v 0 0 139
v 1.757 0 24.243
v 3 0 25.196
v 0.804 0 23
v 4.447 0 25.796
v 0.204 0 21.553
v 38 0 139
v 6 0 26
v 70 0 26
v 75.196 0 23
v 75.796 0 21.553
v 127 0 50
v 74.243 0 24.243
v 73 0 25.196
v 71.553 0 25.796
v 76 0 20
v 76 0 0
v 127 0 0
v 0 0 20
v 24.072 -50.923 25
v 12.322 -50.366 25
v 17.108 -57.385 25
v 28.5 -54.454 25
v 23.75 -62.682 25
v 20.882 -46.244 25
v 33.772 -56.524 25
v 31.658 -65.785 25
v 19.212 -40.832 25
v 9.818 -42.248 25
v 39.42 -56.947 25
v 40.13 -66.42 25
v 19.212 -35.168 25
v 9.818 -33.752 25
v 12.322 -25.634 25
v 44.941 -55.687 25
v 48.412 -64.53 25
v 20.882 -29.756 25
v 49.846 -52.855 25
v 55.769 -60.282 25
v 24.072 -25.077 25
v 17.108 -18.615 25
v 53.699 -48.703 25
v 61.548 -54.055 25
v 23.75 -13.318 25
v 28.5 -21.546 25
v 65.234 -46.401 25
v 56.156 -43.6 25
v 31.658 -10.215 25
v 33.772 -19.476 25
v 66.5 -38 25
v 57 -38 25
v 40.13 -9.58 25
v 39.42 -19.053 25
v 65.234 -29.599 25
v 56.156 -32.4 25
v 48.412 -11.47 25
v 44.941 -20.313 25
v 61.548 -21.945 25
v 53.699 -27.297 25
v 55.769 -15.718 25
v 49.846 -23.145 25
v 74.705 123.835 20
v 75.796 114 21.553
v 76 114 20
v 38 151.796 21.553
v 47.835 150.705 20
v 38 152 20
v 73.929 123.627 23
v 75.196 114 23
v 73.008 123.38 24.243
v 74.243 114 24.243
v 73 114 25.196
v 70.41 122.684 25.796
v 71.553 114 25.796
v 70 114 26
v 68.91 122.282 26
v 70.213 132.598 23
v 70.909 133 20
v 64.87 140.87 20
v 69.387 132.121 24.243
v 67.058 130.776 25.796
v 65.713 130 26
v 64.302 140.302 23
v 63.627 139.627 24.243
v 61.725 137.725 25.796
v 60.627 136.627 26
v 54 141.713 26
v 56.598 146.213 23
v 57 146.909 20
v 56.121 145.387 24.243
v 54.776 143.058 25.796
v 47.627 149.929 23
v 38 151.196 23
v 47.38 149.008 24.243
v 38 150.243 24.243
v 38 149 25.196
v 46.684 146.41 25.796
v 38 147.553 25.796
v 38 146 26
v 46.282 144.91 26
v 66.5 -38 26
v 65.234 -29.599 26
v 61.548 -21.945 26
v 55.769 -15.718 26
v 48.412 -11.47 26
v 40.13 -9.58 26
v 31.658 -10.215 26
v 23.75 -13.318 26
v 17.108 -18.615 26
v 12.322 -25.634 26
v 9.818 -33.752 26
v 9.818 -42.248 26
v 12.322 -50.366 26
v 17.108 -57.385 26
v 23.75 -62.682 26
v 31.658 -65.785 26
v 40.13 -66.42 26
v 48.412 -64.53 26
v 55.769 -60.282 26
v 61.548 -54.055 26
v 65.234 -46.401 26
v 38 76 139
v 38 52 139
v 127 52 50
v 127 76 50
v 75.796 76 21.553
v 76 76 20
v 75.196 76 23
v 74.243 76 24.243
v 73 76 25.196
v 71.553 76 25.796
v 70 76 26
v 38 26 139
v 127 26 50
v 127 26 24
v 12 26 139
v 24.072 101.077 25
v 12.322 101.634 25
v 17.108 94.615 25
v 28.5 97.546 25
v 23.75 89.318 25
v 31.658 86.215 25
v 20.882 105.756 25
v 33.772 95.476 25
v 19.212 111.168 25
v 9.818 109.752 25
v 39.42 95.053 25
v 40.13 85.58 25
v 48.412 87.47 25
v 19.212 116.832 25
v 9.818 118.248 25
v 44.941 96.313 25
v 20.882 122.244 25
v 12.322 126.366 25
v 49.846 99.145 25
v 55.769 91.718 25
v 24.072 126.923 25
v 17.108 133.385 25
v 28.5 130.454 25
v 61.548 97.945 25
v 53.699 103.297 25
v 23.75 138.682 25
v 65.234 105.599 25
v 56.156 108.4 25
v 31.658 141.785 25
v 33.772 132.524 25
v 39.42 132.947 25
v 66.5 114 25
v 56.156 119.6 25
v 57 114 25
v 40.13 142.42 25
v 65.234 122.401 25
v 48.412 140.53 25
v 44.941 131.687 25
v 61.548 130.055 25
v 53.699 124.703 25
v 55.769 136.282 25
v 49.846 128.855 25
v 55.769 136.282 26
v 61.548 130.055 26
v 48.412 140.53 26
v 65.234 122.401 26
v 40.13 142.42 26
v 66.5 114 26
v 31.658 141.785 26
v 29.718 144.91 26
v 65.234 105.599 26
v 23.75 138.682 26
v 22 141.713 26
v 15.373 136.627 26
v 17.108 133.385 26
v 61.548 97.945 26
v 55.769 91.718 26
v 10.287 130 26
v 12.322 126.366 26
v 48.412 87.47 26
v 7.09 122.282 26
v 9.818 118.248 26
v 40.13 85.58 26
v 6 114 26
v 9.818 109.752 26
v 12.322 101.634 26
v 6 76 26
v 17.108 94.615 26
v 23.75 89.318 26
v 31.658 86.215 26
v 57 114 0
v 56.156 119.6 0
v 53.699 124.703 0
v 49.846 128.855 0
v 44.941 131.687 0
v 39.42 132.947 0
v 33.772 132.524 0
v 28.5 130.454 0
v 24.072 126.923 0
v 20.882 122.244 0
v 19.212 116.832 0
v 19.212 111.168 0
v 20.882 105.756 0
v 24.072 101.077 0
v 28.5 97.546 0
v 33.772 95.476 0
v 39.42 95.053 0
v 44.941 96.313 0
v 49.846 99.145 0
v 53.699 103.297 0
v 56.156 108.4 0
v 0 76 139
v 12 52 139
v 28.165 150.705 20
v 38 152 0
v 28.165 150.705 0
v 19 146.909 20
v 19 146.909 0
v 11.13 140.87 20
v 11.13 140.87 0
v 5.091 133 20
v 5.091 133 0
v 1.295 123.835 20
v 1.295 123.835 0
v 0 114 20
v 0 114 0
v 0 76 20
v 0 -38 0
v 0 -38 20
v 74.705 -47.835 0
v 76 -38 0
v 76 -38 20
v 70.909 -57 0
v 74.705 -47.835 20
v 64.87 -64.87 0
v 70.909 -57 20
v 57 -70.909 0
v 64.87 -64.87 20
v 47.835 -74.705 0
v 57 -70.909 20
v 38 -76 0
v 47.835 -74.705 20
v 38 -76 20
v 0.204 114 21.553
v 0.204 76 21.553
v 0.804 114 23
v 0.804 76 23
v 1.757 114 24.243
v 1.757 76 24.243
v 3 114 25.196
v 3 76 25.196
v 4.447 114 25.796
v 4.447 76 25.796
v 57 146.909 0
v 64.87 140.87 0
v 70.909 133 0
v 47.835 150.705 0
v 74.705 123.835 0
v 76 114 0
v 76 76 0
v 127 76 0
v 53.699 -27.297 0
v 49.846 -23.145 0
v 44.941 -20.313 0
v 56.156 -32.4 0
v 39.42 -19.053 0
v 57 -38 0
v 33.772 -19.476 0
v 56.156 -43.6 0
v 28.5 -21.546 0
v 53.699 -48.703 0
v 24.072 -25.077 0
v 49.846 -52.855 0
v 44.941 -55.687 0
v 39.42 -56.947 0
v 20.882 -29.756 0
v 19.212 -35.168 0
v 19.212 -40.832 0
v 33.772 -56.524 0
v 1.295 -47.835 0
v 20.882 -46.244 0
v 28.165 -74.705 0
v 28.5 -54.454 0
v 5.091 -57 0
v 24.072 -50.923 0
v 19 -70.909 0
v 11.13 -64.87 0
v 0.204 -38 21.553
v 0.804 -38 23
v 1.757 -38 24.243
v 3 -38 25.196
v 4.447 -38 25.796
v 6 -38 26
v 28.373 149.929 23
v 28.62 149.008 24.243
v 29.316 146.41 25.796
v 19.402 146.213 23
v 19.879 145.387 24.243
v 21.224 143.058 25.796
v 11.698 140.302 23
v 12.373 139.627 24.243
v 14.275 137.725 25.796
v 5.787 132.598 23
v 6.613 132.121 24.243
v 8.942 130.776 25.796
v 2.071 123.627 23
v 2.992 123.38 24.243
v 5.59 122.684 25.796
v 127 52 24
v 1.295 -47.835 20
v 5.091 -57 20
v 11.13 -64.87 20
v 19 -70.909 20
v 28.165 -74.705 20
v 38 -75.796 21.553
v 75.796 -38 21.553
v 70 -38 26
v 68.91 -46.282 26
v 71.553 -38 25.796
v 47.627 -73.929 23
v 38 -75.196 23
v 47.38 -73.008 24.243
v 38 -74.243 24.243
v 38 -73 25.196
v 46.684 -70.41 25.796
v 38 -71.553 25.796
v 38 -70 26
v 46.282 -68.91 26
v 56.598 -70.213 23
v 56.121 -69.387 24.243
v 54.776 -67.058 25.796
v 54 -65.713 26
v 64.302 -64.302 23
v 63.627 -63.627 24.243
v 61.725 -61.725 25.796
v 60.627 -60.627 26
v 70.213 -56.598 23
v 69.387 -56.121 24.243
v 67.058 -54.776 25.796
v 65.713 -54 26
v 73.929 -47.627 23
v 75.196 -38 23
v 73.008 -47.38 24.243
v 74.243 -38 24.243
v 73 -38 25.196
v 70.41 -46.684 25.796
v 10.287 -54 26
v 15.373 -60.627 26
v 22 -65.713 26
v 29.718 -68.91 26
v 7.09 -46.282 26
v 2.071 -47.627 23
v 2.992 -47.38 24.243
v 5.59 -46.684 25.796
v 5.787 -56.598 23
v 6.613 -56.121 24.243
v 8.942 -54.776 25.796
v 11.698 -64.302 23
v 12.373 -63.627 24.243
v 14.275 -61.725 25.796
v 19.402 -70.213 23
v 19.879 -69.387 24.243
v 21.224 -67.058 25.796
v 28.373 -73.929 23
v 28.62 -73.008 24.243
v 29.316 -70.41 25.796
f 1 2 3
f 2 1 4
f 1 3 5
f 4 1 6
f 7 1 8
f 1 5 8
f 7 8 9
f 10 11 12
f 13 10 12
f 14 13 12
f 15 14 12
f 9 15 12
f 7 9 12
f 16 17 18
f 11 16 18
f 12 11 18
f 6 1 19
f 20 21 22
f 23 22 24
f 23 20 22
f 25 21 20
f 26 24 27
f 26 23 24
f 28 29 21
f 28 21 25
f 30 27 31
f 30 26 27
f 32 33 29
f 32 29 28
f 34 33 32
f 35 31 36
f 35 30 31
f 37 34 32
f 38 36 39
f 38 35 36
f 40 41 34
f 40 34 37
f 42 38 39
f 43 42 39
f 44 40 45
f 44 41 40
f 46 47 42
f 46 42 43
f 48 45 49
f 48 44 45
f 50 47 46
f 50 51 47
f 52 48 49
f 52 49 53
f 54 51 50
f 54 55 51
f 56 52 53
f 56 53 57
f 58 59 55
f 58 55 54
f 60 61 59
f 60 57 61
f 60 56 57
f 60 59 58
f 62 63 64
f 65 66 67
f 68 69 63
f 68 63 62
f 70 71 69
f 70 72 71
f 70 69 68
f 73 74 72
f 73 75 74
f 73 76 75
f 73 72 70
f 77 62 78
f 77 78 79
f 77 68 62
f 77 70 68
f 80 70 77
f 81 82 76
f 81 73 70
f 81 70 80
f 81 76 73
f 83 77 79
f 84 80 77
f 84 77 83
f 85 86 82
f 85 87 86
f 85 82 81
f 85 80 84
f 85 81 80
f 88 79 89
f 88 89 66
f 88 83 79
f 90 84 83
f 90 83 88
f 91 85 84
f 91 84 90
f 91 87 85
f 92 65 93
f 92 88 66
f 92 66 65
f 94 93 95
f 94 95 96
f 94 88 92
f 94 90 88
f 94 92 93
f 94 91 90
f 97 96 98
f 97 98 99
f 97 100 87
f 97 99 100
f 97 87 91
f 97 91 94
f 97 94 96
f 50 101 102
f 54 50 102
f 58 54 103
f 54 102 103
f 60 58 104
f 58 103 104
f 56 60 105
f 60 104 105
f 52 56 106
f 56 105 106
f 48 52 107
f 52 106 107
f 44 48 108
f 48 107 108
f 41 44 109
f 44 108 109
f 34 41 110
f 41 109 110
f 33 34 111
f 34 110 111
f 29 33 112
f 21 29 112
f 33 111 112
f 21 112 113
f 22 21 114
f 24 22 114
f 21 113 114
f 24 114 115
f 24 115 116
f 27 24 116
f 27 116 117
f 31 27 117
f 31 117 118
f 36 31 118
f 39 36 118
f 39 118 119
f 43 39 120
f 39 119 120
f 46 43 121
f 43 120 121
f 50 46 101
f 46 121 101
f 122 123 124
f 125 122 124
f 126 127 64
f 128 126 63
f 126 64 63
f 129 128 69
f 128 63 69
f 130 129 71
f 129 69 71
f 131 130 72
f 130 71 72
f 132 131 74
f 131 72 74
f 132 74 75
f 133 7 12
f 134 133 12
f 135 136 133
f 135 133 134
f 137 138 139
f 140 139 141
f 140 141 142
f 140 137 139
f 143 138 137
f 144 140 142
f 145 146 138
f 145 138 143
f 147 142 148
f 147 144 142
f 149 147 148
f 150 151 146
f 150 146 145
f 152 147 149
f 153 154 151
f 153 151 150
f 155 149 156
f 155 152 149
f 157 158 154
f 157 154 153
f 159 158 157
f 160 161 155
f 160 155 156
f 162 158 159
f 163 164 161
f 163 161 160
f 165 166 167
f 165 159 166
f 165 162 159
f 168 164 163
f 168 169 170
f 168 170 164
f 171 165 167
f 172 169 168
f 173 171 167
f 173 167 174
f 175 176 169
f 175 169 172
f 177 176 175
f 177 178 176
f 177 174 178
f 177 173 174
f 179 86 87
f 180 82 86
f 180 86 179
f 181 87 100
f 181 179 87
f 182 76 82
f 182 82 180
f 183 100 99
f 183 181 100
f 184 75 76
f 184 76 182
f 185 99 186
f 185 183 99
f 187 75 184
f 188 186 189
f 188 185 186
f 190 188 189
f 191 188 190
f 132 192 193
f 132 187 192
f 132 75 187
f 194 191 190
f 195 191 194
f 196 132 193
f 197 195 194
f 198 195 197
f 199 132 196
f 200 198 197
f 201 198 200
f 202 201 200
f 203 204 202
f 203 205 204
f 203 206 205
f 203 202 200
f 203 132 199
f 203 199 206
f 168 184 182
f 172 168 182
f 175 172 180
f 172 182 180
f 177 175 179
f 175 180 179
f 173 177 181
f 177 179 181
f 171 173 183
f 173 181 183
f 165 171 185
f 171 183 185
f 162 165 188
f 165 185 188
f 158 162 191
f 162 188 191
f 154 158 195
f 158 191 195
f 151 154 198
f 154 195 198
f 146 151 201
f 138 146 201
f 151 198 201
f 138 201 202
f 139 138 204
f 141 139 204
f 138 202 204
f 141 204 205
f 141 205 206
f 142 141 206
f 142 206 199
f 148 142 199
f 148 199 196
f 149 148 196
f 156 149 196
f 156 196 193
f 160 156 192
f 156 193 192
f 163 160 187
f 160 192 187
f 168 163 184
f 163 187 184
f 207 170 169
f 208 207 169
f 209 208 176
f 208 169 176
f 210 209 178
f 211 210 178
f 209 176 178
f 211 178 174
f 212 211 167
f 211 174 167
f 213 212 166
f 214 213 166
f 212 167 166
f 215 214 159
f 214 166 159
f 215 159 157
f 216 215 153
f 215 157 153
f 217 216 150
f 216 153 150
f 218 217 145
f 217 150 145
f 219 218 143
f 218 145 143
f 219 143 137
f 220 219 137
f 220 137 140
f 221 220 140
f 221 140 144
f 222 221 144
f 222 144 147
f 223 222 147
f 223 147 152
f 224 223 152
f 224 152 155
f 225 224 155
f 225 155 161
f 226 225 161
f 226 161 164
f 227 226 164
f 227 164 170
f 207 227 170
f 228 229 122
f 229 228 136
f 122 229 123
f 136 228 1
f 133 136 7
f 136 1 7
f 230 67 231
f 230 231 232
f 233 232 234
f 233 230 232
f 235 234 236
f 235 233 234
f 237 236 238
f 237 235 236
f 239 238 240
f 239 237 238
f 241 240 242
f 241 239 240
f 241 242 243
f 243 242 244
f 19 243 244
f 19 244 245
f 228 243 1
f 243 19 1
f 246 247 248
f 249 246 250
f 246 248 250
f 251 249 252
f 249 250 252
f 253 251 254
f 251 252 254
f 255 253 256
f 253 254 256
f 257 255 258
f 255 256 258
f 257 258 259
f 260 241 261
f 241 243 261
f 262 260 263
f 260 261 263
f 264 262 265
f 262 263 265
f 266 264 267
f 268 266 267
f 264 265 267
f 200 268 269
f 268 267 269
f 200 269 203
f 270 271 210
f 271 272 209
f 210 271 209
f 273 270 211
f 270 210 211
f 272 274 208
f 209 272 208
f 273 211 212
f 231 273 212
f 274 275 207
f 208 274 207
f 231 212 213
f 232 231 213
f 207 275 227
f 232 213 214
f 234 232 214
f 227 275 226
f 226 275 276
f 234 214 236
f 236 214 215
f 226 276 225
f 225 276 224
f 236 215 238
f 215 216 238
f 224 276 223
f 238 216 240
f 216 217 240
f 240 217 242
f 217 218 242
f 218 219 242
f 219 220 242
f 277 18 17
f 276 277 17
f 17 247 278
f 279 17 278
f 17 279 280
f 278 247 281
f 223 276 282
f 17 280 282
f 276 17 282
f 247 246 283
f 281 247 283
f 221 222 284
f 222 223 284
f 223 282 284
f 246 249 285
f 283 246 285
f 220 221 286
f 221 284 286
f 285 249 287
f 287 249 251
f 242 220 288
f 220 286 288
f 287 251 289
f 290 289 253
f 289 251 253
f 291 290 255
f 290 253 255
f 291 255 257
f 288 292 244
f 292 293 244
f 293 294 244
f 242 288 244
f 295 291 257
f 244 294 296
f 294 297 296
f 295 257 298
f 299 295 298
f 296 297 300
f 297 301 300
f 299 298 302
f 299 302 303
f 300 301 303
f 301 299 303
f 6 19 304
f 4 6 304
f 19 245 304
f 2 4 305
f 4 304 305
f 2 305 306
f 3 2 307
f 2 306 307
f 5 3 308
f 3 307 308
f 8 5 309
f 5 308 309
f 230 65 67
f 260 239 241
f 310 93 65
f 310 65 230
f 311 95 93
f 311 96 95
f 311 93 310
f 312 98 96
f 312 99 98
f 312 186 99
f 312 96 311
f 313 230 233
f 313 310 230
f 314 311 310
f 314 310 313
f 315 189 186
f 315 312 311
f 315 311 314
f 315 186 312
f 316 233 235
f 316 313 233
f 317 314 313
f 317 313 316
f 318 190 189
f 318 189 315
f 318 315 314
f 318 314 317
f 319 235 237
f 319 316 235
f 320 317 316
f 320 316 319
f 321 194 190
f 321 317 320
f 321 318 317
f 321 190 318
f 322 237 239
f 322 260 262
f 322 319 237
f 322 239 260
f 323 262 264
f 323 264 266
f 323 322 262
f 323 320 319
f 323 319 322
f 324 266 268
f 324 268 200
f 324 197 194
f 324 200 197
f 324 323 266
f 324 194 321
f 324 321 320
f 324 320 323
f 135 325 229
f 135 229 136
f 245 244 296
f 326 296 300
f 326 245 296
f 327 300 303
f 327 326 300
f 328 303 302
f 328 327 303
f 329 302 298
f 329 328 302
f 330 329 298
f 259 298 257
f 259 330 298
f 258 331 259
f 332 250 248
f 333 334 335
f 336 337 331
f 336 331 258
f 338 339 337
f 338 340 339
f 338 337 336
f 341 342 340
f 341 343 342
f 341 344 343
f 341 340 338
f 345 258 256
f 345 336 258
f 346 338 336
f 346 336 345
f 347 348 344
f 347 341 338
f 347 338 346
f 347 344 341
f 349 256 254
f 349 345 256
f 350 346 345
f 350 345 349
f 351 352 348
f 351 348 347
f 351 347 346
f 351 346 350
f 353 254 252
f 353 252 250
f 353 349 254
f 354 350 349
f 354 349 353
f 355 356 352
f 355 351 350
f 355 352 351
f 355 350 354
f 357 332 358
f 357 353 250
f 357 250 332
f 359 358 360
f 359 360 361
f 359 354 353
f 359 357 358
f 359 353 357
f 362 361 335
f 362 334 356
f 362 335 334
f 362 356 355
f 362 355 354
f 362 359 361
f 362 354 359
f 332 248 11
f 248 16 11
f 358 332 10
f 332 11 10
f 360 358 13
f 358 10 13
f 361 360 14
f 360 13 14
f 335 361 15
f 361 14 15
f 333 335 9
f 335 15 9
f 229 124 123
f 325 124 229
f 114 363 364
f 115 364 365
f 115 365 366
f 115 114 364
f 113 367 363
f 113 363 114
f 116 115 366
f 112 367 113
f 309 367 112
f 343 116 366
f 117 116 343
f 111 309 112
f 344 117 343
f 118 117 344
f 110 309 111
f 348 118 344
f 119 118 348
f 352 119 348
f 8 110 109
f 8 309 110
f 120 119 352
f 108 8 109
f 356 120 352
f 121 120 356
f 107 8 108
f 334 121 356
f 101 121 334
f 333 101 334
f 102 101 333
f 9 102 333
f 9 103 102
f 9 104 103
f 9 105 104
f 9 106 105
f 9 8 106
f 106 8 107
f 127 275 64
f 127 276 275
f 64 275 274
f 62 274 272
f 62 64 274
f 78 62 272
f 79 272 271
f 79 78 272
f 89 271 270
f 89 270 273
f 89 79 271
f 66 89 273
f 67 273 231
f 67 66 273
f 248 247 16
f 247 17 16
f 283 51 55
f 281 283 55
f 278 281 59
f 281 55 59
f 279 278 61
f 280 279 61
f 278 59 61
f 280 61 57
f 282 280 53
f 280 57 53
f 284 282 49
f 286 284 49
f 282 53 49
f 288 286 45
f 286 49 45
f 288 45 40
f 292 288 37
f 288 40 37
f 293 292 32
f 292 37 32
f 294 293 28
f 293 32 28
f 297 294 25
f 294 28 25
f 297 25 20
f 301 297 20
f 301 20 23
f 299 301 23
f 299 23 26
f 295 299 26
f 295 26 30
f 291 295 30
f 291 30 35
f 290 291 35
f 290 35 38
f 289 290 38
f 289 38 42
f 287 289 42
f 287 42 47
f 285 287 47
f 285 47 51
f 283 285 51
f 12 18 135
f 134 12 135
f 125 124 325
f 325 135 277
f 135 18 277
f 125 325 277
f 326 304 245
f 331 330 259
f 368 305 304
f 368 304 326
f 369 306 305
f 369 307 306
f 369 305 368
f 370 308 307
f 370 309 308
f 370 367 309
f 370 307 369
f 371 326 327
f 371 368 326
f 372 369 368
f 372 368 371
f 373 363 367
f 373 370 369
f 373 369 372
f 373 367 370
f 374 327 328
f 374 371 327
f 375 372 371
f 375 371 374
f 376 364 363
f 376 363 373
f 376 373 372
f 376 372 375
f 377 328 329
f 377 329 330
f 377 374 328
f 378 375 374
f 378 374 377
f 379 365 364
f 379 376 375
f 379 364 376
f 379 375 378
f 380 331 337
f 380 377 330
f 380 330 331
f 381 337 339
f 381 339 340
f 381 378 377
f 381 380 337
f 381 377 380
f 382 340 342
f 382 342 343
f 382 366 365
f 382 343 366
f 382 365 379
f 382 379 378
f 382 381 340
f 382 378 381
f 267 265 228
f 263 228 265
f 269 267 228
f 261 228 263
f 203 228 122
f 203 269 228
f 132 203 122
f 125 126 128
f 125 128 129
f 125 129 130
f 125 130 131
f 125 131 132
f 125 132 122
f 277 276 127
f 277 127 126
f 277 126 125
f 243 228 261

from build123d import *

# Parameters (mm, degrees)
F0_W      = 127
F0_H      = 76
F1_DEPTH  = 200
F3_DEPTH  = 76.001
F4_W      = 26
F4_H      = 26
F6_W      = 76
F6_H      = 26
F7_DEPTH  = 76
F8_R      = 37.99999
F9_W      = 76
F9_H      = 26
F10_DEPTH = 76
F11_R     = 37.99999
F12_R     = 19
F13_DEPTH = 26.001
F12_R_2   = 28.5
F14_DEPTH = 1
F15_R     = 6
F16_R     = 28.5
F16_R_2   = 19
F17_DEPTH = 1
F18_DEPTH = 26


# Not quite as in the source:
# - a fillet or chamfer is up to 0.001 mm smaller than in the source, because OpenCascade refuses the exact size
# - a feature names something its author has since deleted; it is built from what else it names


with BuildPart() as f1:
    # F0 (on Top) → F1 (new body)
    with BuildSketch(Plane.XY):
        with Locations((63.5, 38)):
            Rectangle(F0_W, F0_H)
    extrude(amount=F1_DEPTH)

    # F2 (on face) → F3 (cut, through all)
    with BuildSketch(Plane.XZ):
        Polygon((38, 139), (127, 50), (127, 200), (0, 200), (0, 177), align=None)
        Polygon((0, 139), (38, 139), (0, 177), align=None)
    extrude(amount=-F3_DEPTH, mode=Mode.SUBTRACT)

    # F5: sweep along a path in F2
    with BuildLine(Plane.XZ) as f5_path:
        Line((0, 177), (191.2105315588, -14.2105315588))
    # F4 (on face) → F5 (sweep, cut)
    with BuildSketch(Plane.XY.offset(139)):
        with Locations((25, 39)):
            Rectangle(F4_W, F4_H)
    sweep(path=f5_path.line, mode=Mode.SUBTRACT)

    # F6 (on face) → F7 (join)
    with BuildSketch(Plane.XZ):
        with Locations((38, 13)):
            Rectangle(F6_W, F6_H)
    extrude(amount=F7_DEPTH)

    # F8 (radius 38 in the source; OpenCascade refuses exactly that, so slightly less here)
    f8_edges = [f1.edges().sort_by_distance(p)[0] for p in [
        (76, -76, 13),
        (0, -76, 13),
    ]]
    fillet(f8_edges, radius=F8_R)

    # F9 (on face) → F10 (join)
    with BuildSketch(Plane(origin=(0, 76, 0), x_dir=(-1, 0, 0), z_dir=(0, 1, 0))):
        with Locations((-38, 13)):
            Rectangle(F9_W, F9_H)
    extrude(amount=F10_DEPTH)

    # F11 (radius 38 in the source; OpenCascade refuses exactly that, so slightly less here)
    f11_edges = [f1.edges().sort_by_distance(p)[0] for p in [
        (0, 152, 13),
        (76, 152, 13),
    ]]
    fillet(f11_edges, radius=F11_R)

    # F12 (on face) → F13 (cut, through all)
    with BuildSketch(Plane.XY.offset(26)):
        with Locations((38, 114)):
            Circle(F12_R)
    extrude(amount=-F13_DEPTH, mode=Mode.SUBTRACT)

    # F12 (on face) → F14 (cut)
    with BuildSketch(Plane.XY.offset(26)):
        with Locations((38, 114)):
            Circle(F12_R_2)
        with Locations((38, 114)):
            Circle(F12_R, mode=Mode.SUBTRACT)
    extrude(amount=-F14_DEPTH, mode=Mode.SUBTRACT)

    # F15
    f15_edges = [f1.edges().sort_by_distance(p)[0] for p in [
        (64.870061, 140.870061, 26),
        (11.129939, -64.870061, 26),
    ]]
    fillet(f15_edges, radius=F15_R)

    # F16 (on face) → F17 (cut)
    with BuildSketch(Plane.XY.offset(26)):
        with Locations((38, -38)):
            Circle(F16_R)
        with Locations((38, -38)):
            Circle(F16_R_2, mode=Mode.SUBTRACT)
    extrude(amount=-F17_DEPTH, mode=Mode.SUBTRACT)

    # F18 (cut, through all): a face of the model
    f18_faces = [f1.faces().sort_by_distance(p)[0] for p in [
        (38, -38, 26),
    ]]
    extrude(f18_faces, amount=-F18_DEPTH, mode=Mode.SUBTRACT)


solid = f1.part
